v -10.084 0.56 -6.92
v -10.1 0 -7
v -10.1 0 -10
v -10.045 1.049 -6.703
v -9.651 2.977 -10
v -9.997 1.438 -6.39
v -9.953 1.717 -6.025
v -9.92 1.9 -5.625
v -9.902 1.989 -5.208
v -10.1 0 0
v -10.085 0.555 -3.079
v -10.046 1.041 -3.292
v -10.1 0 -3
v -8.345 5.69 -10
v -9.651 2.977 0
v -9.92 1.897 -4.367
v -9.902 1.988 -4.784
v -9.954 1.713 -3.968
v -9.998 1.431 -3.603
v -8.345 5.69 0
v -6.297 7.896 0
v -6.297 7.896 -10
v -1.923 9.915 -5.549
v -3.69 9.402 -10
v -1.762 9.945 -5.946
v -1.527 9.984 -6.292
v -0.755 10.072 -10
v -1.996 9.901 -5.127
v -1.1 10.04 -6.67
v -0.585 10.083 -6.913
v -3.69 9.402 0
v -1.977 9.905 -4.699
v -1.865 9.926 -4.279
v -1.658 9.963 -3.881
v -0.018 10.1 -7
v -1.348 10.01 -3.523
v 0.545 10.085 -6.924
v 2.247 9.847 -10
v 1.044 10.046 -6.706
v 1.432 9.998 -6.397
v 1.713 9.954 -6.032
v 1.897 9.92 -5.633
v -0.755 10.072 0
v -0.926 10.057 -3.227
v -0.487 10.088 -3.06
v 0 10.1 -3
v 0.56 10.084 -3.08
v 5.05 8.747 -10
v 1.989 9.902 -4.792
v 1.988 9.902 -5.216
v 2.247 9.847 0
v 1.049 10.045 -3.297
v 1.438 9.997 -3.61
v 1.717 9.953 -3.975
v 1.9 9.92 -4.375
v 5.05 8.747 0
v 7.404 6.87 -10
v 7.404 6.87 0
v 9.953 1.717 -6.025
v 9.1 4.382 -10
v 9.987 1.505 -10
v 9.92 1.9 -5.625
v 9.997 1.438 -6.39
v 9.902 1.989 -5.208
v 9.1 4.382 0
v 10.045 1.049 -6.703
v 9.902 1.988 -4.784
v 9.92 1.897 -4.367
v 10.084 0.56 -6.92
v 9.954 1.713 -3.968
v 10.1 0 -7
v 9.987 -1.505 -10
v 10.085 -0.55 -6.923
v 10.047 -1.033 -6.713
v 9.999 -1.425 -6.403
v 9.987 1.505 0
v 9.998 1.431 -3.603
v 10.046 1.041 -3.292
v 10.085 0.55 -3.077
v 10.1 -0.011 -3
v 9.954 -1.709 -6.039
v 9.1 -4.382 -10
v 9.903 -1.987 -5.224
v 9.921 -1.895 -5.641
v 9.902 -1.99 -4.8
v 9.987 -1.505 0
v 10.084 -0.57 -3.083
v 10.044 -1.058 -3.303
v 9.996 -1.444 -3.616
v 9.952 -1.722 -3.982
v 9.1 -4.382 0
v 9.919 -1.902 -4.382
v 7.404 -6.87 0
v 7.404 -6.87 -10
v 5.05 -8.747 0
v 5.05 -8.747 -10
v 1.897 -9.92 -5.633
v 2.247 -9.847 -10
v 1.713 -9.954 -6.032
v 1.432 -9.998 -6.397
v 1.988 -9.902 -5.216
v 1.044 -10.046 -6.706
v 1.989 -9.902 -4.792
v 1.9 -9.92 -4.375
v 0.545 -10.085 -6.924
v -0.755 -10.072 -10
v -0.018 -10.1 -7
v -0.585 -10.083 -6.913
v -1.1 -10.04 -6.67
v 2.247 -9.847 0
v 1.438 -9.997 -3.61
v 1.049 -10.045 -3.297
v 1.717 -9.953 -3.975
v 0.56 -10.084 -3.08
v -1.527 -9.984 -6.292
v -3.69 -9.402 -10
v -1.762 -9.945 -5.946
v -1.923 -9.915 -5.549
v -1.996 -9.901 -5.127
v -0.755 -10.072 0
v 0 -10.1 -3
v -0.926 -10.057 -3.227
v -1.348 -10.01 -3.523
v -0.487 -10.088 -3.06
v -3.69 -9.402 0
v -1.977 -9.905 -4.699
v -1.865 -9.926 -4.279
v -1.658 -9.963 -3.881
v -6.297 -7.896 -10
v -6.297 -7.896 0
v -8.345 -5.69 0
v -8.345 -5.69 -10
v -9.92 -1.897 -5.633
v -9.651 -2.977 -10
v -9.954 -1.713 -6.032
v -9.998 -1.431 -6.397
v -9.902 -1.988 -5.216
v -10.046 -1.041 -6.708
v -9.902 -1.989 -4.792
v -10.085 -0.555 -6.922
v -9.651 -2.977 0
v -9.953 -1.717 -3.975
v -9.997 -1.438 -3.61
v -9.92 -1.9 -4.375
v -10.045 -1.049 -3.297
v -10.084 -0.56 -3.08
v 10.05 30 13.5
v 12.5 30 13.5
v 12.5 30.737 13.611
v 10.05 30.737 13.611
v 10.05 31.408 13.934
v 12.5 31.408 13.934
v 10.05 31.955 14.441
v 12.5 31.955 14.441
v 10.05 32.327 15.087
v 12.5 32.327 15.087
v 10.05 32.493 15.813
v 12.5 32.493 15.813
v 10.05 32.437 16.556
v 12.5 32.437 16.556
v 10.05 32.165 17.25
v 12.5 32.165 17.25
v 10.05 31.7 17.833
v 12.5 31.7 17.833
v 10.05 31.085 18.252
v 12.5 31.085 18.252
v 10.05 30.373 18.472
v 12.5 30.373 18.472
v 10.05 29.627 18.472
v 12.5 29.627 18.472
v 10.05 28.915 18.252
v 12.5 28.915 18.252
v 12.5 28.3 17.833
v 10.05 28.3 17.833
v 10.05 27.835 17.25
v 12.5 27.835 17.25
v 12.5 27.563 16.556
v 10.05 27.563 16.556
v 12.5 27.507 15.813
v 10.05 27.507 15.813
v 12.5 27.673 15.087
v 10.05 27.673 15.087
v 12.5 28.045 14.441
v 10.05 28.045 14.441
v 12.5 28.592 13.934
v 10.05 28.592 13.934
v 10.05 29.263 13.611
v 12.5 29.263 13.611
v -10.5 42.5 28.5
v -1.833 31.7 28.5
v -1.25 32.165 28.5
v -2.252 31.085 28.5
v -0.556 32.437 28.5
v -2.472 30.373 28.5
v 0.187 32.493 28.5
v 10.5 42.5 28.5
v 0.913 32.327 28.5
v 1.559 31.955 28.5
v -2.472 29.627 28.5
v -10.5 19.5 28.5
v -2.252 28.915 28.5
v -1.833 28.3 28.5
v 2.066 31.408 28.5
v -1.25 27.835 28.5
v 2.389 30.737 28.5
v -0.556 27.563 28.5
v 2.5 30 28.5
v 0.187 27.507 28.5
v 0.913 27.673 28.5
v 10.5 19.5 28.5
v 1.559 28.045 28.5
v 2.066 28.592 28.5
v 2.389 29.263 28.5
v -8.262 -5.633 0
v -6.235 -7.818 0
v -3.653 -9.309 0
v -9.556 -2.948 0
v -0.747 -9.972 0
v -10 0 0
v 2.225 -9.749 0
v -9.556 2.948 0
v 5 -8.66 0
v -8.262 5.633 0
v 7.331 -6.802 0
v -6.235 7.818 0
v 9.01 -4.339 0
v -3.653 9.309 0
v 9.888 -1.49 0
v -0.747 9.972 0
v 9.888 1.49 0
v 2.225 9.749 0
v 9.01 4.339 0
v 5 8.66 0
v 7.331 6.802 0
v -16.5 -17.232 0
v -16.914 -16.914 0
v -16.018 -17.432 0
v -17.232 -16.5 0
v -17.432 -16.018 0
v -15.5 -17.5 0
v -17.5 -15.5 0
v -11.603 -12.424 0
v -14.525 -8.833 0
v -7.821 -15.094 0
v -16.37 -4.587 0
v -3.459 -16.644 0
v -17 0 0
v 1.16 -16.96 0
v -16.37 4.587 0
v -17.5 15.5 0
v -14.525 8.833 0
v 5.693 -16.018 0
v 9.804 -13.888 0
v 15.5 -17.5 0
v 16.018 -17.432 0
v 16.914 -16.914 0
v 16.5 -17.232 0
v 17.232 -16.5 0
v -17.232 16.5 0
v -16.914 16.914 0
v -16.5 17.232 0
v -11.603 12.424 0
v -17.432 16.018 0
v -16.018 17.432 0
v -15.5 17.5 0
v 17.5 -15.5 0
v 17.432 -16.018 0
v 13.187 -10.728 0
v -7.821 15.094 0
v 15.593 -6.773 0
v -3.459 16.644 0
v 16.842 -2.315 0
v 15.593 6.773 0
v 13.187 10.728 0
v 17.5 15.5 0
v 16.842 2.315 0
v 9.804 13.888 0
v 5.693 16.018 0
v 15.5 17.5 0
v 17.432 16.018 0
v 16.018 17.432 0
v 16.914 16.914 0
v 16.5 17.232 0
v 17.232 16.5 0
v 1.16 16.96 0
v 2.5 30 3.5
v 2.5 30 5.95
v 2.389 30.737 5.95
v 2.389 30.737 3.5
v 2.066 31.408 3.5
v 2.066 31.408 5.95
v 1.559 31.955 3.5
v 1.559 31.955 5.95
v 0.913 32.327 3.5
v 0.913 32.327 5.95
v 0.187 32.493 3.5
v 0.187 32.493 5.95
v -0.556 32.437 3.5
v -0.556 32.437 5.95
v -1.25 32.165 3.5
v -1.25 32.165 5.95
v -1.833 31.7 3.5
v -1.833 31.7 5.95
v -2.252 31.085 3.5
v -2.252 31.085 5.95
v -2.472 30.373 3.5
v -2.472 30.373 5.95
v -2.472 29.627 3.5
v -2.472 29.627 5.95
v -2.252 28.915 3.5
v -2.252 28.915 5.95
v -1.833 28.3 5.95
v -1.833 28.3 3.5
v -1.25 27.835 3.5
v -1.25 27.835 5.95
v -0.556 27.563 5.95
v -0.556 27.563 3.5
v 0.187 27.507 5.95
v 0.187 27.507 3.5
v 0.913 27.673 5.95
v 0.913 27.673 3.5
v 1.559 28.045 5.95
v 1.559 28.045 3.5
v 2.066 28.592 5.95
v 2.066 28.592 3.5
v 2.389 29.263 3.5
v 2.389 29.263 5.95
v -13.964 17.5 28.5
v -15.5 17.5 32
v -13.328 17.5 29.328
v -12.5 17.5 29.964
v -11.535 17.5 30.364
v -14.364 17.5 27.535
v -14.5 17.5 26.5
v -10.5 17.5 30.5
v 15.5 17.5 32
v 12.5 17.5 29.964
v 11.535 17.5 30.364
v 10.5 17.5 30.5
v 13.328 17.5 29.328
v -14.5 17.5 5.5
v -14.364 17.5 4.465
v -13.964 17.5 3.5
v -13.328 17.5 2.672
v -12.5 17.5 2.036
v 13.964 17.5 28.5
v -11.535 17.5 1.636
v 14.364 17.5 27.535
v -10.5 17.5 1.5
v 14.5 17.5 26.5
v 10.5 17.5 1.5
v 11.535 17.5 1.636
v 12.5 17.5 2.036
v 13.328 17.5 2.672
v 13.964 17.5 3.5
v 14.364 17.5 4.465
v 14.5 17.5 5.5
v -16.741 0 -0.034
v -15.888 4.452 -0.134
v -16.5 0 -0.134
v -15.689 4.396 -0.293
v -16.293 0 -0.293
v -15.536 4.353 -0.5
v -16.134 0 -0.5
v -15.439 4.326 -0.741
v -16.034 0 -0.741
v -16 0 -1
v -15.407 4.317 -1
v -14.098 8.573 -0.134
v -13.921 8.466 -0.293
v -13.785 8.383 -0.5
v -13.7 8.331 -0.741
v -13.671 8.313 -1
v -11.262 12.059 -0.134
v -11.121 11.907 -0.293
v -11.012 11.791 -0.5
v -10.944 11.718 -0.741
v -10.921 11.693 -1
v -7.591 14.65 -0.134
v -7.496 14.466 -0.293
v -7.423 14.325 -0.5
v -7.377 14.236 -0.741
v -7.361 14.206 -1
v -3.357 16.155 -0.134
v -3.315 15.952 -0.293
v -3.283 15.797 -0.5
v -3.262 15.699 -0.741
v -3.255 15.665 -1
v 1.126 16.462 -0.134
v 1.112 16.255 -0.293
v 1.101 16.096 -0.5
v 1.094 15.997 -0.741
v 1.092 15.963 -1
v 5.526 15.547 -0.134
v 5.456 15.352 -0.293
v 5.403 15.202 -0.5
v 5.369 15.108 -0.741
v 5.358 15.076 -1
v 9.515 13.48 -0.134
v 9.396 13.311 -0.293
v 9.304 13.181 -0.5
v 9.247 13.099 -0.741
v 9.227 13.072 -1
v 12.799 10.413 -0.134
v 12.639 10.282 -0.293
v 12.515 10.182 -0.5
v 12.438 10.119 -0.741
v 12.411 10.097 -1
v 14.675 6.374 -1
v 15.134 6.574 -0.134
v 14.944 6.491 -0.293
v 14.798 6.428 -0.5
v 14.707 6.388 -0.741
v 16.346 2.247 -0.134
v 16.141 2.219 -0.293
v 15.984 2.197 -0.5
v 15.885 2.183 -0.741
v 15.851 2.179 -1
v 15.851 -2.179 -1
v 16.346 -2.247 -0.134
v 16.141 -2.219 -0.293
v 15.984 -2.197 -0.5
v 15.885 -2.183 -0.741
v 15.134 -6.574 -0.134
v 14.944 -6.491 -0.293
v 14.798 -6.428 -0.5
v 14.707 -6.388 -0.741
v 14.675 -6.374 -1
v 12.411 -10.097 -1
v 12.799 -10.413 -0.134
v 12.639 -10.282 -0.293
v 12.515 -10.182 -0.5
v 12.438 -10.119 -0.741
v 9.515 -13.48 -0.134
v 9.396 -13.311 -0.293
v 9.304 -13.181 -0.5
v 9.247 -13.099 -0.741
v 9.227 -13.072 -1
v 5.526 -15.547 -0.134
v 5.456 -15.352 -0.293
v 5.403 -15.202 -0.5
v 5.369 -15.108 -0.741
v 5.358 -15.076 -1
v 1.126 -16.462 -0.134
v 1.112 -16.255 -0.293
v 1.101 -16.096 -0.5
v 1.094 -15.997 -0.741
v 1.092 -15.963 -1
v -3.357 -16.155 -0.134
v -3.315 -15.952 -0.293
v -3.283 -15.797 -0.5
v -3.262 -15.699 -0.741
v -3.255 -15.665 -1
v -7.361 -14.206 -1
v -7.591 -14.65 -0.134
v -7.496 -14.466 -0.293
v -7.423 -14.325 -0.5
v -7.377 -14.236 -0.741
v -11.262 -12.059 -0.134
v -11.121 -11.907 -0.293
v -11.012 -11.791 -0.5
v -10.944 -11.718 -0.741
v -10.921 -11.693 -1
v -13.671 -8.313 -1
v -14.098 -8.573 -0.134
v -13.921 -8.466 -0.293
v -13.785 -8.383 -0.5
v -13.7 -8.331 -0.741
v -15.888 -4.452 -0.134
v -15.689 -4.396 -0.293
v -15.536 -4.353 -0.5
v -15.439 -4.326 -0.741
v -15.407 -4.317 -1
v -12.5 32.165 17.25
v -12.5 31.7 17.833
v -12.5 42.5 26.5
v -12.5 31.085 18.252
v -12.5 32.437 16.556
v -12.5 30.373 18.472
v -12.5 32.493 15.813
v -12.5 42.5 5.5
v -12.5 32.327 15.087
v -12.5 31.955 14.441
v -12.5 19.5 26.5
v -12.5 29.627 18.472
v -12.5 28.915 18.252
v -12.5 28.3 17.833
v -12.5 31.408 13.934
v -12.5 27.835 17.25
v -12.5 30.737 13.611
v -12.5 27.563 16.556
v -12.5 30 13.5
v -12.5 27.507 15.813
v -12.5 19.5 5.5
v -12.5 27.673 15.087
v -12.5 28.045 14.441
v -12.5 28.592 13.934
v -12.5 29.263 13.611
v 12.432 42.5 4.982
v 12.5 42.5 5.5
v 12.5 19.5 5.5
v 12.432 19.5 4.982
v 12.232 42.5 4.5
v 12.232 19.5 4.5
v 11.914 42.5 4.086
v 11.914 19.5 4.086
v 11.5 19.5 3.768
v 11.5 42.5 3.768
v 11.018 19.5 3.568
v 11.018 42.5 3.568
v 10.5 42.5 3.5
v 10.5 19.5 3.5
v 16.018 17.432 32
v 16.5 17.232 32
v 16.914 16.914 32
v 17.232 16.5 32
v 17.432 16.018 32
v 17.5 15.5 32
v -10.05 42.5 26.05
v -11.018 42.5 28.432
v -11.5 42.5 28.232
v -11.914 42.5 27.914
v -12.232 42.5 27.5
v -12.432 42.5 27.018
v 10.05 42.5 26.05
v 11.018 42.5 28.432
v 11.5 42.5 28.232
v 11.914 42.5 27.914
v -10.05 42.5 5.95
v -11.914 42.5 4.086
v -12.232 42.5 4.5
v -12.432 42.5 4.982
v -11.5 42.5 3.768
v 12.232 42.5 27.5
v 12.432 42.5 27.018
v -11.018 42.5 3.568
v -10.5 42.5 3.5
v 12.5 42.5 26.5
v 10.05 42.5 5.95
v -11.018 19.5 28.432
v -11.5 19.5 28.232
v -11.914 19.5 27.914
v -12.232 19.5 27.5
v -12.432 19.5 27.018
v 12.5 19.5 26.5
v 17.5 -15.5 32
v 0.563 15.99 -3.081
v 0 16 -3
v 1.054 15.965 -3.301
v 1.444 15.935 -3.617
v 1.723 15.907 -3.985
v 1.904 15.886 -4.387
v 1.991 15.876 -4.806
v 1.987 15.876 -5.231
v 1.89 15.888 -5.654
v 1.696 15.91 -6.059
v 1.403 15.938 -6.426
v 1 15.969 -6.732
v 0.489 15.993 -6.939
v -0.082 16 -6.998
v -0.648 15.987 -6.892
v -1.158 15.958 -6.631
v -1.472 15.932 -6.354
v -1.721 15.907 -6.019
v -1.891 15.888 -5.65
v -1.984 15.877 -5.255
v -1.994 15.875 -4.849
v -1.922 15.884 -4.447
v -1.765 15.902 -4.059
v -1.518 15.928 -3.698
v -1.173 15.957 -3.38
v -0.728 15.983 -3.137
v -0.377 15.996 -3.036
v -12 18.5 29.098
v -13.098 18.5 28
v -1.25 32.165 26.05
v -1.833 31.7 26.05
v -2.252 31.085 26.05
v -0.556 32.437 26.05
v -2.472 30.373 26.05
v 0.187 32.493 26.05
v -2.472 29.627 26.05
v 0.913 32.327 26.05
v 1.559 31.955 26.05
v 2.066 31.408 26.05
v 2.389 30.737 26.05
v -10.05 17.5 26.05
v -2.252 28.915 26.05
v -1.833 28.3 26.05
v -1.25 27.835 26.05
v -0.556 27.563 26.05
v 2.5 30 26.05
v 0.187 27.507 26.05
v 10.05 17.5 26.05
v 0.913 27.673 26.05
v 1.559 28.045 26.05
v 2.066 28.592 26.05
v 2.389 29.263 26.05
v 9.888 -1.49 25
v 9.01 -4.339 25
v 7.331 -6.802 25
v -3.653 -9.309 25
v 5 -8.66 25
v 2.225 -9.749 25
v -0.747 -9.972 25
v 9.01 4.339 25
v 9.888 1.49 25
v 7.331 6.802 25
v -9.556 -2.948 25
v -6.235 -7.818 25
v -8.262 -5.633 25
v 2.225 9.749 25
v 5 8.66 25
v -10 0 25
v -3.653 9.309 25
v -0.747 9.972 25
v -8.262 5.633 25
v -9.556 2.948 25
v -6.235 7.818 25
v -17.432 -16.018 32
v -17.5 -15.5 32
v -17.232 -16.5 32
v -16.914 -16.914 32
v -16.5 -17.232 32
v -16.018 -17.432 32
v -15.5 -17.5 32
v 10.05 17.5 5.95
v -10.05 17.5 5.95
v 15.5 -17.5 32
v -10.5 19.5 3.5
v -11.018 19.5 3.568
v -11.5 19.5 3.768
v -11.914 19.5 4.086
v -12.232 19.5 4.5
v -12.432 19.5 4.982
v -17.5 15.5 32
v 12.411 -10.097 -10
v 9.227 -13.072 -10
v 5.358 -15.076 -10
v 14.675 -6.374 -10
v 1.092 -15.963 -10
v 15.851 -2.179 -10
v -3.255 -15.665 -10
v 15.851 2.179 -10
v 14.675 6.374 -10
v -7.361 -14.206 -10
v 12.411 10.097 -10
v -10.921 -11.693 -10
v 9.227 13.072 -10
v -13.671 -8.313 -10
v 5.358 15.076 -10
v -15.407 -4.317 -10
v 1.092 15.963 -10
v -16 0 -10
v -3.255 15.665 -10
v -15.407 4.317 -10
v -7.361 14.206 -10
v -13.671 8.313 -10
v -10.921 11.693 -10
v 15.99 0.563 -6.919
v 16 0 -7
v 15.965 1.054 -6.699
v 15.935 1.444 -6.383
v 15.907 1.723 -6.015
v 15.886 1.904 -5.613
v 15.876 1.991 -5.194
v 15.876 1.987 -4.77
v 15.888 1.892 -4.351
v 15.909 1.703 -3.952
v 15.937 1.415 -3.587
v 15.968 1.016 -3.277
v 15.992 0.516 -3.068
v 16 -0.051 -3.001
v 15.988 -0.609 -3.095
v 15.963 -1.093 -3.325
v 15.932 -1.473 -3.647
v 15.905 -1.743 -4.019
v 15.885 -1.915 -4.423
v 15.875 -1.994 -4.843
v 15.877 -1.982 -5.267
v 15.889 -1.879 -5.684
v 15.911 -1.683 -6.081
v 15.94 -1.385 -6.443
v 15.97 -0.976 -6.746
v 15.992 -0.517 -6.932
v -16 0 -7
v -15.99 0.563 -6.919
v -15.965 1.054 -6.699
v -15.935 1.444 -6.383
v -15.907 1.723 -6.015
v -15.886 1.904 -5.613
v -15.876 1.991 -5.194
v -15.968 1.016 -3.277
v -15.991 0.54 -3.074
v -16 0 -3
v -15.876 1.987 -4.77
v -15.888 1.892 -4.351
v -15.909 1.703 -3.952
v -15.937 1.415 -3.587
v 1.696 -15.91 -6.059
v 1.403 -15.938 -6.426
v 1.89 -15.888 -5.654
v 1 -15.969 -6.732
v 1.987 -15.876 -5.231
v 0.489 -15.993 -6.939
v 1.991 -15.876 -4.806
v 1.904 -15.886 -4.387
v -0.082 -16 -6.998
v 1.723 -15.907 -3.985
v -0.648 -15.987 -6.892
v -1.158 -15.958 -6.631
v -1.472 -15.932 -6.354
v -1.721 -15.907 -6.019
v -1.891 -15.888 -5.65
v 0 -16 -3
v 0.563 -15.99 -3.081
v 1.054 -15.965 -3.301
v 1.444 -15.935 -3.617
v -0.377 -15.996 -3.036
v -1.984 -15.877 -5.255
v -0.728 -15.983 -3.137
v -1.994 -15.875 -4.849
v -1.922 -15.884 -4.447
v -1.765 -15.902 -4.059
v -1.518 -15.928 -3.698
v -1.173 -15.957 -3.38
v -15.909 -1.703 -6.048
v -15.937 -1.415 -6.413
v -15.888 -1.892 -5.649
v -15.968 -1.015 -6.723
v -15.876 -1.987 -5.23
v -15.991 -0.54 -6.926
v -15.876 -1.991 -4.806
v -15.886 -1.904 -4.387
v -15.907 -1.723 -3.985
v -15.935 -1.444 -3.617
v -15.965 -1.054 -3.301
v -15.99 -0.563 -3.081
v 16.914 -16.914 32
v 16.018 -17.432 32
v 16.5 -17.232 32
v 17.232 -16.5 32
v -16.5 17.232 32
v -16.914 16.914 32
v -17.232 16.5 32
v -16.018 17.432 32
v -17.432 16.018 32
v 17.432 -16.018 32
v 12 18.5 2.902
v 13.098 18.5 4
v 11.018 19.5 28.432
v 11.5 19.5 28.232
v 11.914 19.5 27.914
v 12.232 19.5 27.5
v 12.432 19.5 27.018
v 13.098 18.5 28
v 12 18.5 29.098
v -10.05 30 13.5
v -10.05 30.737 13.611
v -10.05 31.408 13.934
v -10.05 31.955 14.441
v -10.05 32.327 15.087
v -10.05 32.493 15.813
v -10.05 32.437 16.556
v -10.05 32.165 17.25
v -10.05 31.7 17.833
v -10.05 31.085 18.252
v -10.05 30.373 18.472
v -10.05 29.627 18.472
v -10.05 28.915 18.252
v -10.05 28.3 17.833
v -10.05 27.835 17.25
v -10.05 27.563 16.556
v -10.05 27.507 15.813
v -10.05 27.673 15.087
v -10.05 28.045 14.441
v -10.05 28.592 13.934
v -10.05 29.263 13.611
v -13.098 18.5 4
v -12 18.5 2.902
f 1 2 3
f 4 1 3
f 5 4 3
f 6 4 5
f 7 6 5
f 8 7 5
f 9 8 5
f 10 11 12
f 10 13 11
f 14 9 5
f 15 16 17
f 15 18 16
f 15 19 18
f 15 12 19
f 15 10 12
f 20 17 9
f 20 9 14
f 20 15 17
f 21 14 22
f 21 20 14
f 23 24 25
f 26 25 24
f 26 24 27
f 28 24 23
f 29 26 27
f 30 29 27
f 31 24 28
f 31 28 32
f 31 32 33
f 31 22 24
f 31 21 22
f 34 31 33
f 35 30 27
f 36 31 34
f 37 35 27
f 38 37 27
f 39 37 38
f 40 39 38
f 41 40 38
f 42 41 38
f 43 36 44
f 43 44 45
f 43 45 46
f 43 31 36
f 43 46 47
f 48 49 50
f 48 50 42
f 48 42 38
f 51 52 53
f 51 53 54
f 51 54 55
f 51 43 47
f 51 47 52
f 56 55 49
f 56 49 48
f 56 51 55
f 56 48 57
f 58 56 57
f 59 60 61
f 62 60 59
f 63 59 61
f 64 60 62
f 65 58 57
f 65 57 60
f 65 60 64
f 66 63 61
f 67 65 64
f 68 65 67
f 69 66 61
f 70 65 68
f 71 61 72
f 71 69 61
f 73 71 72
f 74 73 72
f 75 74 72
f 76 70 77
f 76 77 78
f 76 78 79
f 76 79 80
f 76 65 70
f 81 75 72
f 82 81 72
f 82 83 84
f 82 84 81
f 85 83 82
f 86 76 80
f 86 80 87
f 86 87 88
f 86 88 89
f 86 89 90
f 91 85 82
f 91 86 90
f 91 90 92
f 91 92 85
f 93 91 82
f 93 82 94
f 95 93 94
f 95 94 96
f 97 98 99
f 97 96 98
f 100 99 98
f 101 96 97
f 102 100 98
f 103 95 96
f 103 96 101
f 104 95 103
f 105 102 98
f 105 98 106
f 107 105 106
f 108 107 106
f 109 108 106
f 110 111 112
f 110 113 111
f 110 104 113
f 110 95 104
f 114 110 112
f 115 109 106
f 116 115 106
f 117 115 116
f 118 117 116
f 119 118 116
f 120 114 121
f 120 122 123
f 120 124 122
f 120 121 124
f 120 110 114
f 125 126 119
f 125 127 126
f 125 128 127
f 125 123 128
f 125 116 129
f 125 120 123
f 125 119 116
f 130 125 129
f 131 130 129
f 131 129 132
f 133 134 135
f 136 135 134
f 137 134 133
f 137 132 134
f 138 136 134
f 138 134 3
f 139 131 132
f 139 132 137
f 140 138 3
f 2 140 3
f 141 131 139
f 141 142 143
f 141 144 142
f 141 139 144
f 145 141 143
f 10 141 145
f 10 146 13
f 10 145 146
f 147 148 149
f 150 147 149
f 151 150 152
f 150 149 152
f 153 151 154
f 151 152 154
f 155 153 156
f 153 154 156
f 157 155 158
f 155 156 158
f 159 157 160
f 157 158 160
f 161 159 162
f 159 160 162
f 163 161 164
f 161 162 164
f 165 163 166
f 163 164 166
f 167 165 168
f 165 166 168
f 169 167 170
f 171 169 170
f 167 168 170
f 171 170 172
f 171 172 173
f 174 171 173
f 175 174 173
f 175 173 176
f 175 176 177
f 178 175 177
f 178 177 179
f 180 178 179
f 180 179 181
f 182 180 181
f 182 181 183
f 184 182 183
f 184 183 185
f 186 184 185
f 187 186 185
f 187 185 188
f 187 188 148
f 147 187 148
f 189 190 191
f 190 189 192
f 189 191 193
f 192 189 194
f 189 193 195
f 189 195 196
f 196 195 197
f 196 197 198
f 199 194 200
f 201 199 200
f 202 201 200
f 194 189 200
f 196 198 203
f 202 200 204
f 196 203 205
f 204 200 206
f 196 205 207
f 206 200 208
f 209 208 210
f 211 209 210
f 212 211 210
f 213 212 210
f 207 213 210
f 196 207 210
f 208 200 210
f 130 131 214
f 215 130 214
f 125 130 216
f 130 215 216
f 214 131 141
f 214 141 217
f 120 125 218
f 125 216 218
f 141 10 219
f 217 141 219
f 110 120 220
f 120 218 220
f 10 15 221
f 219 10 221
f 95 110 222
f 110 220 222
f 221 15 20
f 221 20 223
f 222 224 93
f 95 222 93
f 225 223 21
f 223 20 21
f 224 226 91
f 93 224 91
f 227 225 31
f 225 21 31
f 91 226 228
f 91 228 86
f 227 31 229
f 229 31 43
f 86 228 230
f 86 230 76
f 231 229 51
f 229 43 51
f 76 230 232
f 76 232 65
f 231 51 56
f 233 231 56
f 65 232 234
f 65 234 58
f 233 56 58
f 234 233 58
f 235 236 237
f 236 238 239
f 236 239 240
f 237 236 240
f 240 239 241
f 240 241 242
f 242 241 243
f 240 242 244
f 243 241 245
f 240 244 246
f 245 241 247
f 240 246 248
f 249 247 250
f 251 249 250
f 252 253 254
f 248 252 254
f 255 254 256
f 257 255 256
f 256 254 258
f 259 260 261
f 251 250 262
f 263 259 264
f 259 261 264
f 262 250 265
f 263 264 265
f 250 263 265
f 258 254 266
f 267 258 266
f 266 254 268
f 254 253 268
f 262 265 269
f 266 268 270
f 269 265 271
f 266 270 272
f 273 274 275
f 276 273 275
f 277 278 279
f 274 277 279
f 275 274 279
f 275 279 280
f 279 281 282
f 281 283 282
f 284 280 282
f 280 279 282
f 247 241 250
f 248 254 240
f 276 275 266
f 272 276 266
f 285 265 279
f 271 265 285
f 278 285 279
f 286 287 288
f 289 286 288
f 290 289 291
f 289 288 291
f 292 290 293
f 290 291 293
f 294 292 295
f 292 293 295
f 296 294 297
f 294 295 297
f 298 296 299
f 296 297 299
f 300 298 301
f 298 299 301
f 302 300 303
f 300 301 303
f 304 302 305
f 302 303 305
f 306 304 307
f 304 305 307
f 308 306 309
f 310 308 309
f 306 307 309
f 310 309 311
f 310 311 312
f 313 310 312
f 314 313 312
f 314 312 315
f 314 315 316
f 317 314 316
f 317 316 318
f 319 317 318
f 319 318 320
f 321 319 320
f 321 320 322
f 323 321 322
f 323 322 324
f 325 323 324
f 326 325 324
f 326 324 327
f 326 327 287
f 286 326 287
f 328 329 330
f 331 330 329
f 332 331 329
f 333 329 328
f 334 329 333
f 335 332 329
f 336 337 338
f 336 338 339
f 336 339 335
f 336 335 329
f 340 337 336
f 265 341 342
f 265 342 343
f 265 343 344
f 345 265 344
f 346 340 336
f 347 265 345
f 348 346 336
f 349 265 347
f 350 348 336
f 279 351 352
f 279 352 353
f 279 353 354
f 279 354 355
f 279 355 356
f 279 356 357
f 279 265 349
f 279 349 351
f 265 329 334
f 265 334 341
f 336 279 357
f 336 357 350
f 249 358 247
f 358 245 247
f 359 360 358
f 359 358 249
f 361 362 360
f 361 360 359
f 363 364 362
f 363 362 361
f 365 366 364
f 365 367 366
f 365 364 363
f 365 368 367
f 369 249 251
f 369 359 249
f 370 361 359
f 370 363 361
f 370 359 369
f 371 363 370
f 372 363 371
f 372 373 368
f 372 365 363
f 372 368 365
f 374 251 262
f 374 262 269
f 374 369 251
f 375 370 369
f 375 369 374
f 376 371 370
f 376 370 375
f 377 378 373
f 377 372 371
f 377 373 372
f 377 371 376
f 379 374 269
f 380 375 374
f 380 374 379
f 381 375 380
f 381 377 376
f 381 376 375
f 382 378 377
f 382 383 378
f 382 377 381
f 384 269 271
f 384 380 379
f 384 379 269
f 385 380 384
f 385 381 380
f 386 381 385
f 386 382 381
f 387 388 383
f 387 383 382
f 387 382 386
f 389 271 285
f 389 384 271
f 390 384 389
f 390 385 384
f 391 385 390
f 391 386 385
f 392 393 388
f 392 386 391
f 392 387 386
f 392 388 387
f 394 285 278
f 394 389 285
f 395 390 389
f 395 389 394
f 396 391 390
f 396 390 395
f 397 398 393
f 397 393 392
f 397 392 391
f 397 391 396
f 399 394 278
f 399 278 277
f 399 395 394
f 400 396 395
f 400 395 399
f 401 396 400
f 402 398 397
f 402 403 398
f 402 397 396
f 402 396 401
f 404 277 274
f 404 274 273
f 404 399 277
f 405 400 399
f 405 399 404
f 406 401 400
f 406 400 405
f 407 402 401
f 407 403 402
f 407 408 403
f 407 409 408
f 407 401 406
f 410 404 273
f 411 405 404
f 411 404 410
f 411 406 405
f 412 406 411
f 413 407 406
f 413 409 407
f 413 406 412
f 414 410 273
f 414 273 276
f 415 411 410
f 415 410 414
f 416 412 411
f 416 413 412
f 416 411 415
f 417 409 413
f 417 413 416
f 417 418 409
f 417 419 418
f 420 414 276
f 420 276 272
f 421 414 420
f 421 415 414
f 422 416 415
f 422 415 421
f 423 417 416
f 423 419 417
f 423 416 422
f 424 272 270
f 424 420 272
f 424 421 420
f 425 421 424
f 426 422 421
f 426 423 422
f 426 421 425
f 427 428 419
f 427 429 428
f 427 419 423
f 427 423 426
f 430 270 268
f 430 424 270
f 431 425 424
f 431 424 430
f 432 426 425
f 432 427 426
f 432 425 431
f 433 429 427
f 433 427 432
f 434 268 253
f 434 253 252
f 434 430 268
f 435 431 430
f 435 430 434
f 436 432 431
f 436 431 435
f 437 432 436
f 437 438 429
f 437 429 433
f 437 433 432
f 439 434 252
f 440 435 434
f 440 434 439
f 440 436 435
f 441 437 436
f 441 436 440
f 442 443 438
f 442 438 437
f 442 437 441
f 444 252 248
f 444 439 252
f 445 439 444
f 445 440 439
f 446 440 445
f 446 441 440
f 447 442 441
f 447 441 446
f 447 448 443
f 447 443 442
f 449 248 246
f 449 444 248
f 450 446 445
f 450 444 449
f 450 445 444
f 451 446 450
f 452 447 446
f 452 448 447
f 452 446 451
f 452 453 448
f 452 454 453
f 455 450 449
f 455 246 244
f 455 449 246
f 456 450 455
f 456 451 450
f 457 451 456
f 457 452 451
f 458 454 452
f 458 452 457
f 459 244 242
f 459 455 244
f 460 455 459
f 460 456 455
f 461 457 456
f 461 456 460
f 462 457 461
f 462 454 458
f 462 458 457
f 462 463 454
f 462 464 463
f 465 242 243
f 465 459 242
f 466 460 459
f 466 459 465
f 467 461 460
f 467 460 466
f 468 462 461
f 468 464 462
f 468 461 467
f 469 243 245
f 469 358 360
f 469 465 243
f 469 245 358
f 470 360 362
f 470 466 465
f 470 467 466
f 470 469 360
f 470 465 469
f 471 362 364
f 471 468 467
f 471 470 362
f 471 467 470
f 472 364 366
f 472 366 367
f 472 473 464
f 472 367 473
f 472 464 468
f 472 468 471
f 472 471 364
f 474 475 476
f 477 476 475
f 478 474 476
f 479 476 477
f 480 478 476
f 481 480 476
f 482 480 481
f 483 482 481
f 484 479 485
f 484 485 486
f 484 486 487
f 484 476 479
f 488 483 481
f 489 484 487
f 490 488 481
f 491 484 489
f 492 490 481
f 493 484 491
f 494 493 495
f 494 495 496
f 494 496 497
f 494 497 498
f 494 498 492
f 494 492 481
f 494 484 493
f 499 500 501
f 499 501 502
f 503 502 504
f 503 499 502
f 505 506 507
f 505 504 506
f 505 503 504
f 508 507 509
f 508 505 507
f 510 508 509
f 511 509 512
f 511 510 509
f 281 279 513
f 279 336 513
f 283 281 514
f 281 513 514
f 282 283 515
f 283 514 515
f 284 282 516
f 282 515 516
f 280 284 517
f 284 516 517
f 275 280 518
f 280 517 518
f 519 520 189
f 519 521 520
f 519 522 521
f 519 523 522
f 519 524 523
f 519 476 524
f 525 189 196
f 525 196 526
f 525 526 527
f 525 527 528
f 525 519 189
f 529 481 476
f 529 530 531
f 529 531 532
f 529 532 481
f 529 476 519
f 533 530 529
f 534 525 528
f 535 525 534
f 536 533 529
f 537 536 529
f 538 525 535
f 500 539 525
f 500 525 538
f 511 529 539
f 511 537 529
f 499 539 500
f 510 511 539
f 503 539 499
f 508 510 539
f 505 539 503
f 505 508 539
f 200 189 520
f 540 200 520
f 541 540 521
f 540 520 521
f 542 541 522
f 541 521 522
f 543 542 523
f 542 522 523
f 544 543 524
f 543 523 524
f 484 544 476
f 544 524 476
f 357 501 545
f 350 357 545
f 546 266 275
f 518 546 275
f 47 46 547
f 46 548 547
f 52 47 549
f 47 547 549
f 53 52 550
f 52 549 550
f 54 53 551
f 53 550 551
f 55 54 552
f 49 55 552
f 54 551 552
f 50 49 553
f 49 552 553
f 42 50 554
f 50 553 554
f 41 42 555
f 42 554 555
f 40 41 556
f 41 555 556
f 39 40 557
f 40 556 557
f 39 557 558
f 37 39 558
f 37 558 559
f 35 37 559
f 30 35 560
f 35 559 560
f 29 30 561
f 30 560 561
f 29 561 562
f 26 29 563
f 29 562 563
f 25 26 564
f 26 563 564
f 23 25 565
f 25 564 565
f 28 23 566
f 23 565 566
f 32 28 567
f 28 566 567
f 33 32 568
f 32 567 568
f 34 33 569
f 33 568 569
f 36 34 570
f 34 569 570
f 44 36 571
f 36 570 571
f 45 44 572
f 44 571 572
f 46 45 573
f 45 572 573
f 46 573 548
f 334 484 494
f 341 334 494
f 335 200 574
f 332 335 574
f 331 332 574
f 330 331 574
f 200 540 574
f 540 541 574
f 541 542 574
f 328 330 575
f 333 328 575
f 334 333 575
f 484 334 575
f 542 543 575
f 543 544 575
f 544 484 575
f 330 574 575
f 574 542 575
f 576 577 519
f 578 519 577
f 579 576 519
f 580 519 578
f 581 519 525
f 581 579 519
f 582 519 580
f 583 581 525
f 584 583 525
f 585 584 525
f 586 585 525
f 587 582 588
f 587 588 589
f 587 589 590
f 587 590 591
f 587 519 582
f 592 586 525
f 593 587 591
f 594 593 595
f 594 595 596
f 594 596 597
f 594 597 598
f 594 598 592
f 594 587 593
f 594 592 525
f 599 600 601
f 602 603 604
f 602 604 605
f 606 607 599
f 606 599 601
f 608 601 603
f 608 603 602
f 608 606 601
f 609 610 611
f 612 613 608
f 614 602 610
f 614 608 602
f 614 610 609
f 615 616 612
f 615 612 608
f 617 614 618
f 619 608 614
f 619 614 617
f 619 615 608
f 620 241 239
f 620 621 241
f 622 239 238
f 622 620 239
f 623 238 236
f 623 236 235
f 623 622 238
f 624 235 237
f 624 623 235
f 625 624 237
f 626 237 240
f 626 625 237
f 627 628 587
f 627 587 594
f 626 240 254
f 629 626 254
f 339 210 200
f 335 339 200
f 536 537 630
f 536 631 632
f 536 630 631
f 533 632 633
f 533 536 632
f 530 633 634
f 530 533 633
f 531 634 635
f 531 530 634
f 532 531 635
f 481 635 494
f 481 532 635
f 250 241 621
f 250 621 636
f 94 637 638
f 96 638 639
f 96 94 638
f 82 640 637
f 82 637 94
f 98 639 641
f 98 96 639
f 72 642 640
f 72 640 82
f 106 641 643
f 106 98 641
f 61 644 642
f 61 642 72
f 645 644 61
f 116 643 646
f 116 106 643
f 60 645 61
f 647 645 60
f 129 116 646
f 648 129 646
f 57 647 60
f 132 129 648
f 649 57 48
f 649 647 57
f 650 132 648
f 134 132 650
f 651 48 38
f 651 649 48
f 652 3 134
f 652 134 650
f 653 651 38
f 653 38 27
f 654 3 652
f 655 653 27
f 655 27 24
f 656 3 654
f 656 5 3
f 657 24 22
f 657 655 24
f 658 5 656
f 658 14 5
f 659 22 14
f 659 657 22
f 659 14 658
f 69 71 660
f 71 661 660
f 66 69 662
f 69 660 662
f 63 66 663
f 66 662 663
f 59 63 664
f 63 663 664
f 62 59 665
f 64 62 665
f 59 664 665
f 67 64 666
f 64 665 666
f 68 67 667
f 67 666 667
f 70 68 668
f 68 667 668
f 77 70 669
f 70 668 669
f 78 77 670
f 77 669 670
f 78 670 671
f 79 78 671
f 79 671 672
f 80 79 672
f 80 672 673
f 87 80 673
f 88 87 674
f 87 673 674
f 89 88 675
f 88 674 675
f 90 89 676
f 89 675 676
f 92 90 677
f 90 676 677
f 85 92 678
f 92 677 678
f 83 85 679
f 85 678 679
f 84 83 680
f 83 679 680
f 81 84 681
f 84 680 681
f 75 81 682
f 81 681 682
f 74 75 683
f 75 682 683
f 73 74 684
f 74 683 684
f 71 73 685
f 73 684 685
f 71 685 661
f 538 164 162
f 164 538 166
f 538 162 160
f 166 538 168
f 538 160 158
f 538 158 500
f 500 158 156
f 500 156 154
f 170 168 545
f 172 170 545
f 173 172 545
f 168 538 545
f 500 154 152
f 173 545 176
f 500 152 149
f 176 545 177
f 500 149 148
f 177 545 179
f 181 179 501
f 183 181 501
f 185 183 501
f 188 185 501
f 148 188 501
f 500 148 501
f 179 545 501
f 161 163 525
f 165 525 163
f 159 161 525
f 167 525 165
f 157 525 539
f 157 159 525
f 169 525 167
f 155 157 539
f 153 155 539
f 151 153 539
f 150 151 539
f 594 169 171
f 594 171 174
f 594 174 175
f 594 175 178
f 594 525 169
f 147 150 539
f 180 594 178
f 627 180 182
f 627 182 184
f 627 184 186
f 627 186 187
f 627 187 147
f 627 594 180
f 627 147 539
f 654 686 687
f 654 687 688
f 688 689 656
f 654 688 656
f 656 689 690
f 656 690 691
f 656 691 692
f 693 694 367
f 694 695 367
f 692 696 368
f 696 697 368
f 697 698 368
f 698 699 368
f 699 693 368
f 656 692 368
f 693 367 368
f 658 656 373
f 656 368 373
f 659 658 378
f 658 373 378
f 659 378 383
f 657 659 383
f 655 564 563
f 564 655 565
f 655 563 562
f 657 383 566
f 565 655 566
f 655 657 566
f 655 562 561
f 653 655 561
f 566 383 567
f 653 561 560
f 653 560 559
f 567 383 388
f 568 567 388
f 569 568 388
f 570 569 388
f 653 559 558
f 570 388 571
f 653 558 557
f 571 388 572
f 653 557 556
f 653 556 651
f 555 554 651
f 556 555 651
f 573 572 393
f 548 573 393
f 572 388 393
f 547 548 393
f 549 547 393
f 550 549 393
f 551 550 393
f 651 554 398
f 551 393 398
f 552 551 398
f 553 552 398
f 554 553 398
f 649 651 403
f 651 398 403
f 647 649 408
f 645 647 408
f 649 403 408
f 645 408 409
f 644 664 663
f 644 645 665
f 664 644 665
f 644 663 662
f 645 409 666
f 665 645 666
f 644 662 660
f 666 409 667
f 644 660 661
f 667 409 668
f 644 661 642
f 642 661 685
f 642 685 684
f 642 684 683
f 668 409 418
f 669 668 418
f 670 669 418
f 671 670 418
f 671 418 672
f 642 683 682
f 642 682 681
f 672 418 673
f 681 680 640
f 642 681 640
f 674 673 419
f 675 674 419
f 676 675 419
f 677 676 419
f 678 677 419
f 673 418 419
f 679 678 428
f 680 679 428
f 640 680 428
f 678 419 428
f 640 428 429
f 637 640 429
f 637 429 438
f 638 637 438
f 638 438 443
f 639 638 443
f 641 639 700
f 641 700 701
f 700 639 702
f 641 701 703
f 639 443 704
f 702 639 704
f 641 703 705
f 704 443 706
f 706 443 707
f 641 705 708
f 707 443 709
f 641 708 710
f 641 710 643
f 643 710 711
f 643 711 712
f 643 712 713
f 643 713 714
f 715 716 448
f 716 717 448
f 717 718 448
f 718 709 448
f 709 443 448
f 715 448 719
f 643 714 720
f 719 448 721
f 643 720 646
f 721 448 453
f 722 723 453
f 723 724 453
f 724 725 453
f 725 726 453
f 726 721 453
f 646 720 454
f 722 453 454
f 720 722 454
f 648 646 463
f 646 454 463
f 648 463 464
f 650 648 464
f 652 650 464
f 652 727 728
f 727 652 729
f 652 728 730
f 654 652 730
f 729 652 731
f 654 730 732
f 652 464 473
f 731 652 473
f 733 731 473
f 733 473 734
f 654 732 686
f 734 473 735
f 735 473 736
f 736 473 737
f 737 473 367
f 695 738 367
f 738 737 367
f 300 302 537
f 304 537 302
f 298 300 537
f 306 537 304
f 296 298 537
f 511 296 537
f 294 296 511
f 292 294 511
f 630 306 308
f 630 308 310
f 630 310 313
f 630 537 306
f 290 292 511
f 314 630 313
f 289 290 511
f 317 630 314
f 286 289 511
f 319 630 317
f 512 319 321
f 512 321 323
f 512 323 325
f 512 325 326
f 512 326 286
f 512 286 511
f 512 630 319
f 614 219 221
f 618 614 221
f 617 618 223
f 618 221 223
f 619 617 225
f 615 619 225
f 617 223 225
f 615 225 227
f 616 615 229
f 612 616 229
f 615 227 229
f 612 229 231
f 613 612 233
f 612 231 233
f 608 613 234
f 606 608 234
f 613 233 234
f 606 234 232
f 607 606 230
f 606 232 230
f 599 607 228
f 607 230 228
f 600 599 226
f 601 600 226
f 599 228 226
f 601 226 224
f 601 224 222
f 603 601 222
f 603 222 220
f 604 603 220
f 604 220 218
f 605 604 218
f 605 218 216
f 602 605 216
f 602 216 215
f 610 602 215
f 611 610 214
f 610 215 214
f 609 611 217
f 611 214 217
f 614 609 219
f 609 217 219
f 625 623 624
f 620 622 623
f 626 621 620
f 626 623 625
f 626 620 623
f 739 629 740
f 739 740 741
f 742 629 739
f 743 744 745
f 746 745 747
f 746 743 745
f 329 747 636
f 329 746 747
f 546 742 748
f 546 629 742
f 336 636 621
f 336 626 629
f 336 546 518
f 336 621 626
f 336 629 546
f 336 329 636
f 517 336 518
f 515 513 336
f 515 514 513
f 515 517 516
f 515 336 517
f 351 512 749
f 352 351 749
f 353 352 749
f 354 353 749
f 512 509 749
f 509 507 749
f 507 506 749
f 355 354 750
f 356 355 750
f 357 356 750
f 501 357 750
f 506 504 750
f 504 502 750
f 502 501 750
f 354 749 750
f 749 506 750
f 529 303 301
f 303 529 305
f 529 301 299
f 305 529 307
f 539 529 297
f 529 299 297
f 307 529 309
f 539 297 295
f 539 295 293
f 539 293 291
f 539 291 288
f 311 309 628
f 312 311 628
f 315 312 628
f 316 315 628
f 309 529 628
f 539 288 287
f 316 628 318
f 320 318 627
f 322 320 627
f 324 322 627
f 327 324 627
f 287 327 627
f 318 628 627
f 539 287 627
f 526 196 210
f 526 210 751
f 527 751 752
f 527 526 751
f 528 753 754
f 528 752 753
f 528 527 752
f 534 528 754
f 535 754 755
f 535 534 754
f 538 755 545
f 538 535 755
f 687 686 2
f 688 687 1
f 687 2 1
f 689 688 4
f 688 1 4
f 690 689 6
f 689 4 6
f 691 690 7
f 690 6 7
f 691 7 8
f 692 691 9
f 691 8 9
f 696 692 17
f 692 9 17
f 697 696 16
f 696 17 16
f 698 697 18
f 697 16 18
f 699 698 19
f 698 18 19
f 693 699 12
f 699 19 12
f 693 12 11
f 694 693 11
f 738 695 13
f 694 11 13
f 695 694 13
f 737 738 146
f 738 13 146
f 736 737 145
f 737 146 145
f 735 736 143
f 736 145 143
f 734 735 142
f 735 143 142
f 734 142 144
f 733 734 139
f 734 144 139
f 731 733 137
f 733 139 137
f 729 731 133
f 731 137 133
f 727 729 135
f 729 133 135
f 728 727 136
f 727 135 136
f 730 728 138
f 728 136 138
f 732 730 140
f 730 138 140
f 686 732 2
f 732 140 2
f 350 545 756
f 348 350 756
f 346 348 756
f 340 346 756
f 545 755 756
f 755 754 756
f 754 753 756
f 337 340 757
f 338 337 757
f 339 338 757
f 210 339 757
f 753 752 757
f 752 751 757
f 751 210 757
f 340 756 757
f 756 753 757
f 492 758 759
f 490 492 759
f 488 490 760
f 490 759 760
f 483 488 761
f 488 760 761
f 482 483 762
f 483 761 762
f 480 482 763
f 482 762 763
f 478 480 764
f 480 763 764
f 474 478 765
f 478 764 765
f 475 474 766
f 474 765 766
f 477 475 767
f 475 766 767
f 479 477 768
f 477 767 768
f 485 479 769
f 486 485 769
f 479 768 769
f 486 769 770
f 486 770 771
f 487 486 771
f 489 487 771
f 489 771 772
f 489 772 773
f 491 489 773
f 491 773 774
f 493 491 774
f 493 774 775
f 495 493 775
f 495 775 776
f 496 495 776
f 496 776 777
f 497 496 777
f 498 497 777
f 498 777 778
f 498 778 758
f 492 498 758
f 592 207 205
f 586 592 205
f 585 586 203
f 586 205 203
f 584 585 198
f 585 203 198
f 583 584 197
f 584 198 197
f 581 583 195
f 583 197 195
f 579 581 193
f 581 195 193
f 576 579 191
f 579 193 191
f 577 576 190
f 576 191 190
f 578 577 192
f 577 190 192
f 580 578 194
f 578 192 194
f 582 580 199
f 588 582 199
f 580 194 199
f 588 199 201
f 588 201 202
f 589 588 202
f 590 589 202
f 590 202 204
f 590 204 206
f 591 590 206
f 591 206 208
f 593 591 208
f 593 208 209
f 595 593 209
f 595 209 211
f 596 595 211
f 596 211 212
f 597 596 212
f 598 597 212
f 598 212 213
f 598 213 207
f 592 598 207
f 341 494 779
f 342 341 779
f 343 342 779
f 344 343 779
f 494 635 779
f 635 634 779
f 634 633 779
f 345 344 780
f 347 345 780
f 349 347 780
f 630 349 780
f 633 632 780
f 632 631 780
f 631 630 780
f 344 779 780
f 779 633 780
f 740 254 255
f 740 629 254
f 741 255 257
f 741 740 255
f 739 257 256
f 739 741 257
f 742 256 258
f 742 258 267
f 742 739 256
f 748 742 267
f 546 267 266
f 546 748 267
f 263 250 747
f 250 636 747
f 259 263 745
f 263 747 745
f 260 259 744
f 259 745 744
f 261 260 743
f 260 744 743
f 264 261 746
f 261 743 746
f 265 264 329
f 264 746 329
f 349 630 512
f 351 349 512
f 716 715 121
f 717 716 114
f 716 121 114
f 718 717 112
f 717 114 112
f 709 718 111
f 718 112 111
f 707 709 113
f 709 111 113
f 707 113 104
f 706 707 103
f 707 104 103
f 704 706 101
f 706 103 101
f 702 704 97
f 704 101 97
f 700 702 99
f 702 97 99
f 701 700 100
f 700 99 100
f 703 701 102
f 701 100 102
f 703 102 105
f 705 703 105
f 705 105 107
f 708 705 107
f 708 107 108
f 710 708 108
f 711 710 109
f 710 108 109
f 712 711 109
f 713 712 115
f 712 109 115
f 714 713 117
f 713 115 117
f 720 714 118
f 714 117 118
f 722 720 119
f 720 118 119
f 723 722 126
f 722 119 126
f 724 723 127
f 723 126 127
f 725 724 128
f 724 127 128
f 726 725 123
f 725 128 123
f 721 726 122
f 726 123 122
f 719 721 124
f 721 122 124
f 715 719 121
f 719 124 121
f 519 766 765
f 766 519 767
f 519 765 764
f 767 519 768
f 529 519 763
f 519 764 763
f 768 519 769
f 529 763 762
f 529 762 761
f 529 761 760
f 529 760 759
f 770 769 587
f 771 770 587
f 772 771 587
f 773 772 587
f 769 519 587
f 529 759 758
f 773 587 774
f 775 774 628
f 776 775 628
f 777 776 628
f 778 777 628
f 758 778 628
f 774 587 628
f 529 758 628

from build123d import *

# Parameters (mm, degrees)
SKETCH1_W           = 35
SKETCH1_H           = 35
BOSS_EXTRUDE1_DEPTH = 32
SKETCH2_R           = 16
SKETCH2_R_2         = 10.1
BOSS_EXTRUDE2_DEPTH = 10
SKETCH3_R           = 10
CUT_EXTRUDE1_DEPTH  = 25
SKETCH4_R           = 2
CUT_EXTRUDE2_DEPTH  = 20
SKETCH5_R           = 2
CUT_EXTRUDE3_DEPTH  = 20
SKETCH6_W           = 25
SKETCH6_H           = 25
SKETCH6_W_2         = 20.1
SKETCH6_H_2         = 20.1
BOSS_EXTRUDE3_DEPTH = 25
SKETCH7_R           = 2.5
CUT_EXTRUDE4_DEPTH  = 60.956234102
SKETCH8_R           = 2.5
CUT_EXTRUDE5_DEPTH  = 25
FILLET1_R           = 2
FILLET2_R           = 2
FILLET3_R           = 1
CHAMFER1_SIZE       = 2


with BuildPart() as part:
    # Sketch1 → Boss-Extrude1 (new body)
    with BuildSketch(Plane.XY):
        Rectangle(SKETCH1_W, SKETCH1_H)
    extrude(amount=BOSS_EXTRUDE1_DEPTH)

    # Sketch2 → Boss-Extrude2 (add)
    with BuildSketch(Plane(origin=(0, 0, 0), x_dir=(-1, 0, 0), z_dir=(0, 0, -1))):
        Circle(SKETCH2_R)
        Circle(SKETCH2_R_2, mode=Mode.SUBTRACT)
    extrude(amount=BOSS_EXTRUDE2_DEPTH)

    # Sketch3 → Cut-Extrude1 (cut)
    with BuildSketch(Plane(origin=(0, 0, 0), x_dir=(-1, 0, 0), z_dir=(0, 0, -1))):
        Circle(SKETCH3_R)
    extrude(amount=-CUT_EXTRUDE1_DEPTH, mode=Mode.SUBTRACT)

    # Sketch4 → Cut-Extrude2 (cut, symmetric)
    with BuildSketch(Plane(origin=(0, 0, 0), x_dir=(1, 0, 0), z_dir=(0, 1, 0))):
        with Locations(Location((0, 5, 0), (0, 0, 270))):
            Circle(SKETCH4_R)
    extrude(amount=CUT_EXTRUDE2_DEPTH, both=True, mode=Mode.SUBTRACT)

    # Sketch5 → Cut-Extrude3 (cut, symmetric)
    with BuildSketch(Plane(origin=(0, 0, 0), x_dir=(0, 0, -1), z_dir=(1, 0, 0))):
        with Locations((5, 0)):
            Circle(SKETCH5_R)
    extrude(amount=CUT_EXTRUDE3_DEPTH, both=True, mode=Mode.SUBTRACT)

    # Sketch6 → Boss-Extrude3 (add)
    with BuildSketch(Plane(origin=(0, 17.5, 0), x_dir=(1, 0, 0), z_dir=(0, 1, 0))):
        with Locations((0, -16)):
            Rectangle(SKETCH6_W, SKETCH6_H)
        with Locations((0, -16)):
            Rectangle(SKETCH6_W_2, SKETCH6_H_2, mode=Mode.SUBTRACT)
    extrude(amount=BOSS_EXTRUDE3_DEPTH)

    # Sketch7 → Cut-Extrude4 (cut, through all)
    with BuildSketch(Plane.XY.offset(28.5)):
        with Locations((0, 30)):
            Circle(SKETCH7_R)
    extrude(amount=-CUT_EXTRUDE4_DEPTH, mode=Mode.SUBTRACT)

    # Sketch8 → Cut-Extrude5 (cut)
    with BuildSketch(Plane(origin=(12.5, 0, 0), x_dir=(0, 0, -1), z_dir=(1, 0, 0))):
        with Locations((-16, 30)):
            Circle(SKETCH8_R)
    extrude(amount=-CUT_EXTRUDE5_DEPTH, mode=Mode.SUBTRACT)

    # Fillet1
    fillet1_edges = [part.edges().sort_by_distance(p)[0] for p in [
        (-12.5, 30, 3.5),
        (-12.5, 30, 28.5),
        (12.5, 30, 28.5),
        (12.5, 30, 3.5),
        (-17.5, 17.5, 16),
        (17.5, 17.5, 16),
    ]]
    fillet(fillet1_edges, radius=FILLET1_R)

    # Fillet2
    fillet2_edges = [part.edges().sort_by_distance(p)[0] for p in [
        (17.5, -17.5, 16),
        (-17.5, -17.5, 16),
    ]]
    fillet(fillet2_edges, radius=FILLET2_R)

    # Fillet3
    fillet3_edges = [part.edges().sort_by_distance(p)[0] for p in [
        (16, 0, 0),
    ]]
    fillet(fillet3_edges, radius=FILLET3_R)

    # Chamfer1
    chamfer1_edges = [part.edges().sort_by_distance(p)[0] for p in [
        (-12.5, 17.5, 16),
        (0, 17.5, 3.5),
        (12.5, 17.5, 16),
        (0, 17.5, 28.5),
        (11.914213562, 17.5, 27.914213562),
        (11.914213562, 17.5, 4.085786438),
        (-11.914213562, 17.5, 4.085786438),
        (-11.914213562, 17.5, 27.914213562),
    ]]
    chamfer(chamfer1_edges, length=CHAMFER1_SIZE)


solid = part.part
